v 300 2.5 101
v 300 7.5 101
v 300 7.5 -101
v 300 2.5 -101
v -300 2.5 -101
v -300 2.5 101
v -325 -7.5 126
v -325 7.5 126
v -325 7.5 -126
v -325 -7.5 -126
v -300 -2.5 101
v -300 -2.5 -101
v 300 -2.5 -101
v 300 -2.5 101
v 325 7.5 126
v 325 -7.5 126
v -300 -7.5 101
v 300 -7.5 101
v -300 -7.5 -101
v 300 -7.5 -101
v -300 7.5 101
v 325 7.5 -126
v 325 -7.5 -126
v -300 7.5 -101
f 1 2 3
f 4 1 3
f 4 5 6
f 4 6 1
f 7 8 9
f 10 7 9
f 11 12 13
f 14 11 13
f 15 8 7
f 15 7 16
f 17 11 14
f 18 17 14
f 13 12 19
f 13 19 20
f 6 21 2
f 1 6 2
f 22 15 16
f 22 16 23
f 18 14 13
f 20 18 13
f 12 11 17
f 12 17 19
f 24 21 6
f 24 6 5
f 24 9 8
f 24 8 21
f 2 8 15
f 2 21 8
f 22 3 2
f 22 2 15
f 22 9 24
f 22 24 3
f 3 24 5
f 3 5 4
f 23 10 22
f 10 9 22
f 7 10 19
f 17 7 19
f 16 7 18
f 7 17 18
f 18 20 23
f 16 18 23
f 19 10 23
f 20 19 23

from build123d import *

# Parameters (mm, degrees)
SKETCH_1_W      = 650
SKETCH_1_H      = 252
SKETCH_1_W_2    = 600
SKETCH_1_H_2    = 202
EXTRUDE_1_DEPTH = 7.5
SKETCH_2_W      = 600
SKETCH_2_H      = 202
EXTRUDE_2_DEPTH = 2.5


with BuildPart() as part:
    # 草图1 → 凸台-拉伸1 (new body, symmetric)
    with BuildSketch(Plane(origin=(0, 0, 0), x_dir=(1, 0, 0), z_dir=(0, 1, 0))):
        Rectangle(SKETCH_1_W, SKETCH_1_H)
        Rectangle(SKETCH_1_W_2, SKETCH_1_H_2, mode=Mode.SUBTRACT)
    extrude(amount=EXTRUDE_1_DEPTH, both=True)

    # 草图2 → 凸台-拉伸2 (add, symmetric)
    with BuildSketch(Plane(origin=(0, 0, 0), x_dir=(1, 0, 0), z_dir=(0, 1, 0))):
        Rectangle(SKETCH_2_W, SKETCH_2_H)
    extrude(amount=EXTRUDE_2_DEPTH, both=True)


solid = part.part
